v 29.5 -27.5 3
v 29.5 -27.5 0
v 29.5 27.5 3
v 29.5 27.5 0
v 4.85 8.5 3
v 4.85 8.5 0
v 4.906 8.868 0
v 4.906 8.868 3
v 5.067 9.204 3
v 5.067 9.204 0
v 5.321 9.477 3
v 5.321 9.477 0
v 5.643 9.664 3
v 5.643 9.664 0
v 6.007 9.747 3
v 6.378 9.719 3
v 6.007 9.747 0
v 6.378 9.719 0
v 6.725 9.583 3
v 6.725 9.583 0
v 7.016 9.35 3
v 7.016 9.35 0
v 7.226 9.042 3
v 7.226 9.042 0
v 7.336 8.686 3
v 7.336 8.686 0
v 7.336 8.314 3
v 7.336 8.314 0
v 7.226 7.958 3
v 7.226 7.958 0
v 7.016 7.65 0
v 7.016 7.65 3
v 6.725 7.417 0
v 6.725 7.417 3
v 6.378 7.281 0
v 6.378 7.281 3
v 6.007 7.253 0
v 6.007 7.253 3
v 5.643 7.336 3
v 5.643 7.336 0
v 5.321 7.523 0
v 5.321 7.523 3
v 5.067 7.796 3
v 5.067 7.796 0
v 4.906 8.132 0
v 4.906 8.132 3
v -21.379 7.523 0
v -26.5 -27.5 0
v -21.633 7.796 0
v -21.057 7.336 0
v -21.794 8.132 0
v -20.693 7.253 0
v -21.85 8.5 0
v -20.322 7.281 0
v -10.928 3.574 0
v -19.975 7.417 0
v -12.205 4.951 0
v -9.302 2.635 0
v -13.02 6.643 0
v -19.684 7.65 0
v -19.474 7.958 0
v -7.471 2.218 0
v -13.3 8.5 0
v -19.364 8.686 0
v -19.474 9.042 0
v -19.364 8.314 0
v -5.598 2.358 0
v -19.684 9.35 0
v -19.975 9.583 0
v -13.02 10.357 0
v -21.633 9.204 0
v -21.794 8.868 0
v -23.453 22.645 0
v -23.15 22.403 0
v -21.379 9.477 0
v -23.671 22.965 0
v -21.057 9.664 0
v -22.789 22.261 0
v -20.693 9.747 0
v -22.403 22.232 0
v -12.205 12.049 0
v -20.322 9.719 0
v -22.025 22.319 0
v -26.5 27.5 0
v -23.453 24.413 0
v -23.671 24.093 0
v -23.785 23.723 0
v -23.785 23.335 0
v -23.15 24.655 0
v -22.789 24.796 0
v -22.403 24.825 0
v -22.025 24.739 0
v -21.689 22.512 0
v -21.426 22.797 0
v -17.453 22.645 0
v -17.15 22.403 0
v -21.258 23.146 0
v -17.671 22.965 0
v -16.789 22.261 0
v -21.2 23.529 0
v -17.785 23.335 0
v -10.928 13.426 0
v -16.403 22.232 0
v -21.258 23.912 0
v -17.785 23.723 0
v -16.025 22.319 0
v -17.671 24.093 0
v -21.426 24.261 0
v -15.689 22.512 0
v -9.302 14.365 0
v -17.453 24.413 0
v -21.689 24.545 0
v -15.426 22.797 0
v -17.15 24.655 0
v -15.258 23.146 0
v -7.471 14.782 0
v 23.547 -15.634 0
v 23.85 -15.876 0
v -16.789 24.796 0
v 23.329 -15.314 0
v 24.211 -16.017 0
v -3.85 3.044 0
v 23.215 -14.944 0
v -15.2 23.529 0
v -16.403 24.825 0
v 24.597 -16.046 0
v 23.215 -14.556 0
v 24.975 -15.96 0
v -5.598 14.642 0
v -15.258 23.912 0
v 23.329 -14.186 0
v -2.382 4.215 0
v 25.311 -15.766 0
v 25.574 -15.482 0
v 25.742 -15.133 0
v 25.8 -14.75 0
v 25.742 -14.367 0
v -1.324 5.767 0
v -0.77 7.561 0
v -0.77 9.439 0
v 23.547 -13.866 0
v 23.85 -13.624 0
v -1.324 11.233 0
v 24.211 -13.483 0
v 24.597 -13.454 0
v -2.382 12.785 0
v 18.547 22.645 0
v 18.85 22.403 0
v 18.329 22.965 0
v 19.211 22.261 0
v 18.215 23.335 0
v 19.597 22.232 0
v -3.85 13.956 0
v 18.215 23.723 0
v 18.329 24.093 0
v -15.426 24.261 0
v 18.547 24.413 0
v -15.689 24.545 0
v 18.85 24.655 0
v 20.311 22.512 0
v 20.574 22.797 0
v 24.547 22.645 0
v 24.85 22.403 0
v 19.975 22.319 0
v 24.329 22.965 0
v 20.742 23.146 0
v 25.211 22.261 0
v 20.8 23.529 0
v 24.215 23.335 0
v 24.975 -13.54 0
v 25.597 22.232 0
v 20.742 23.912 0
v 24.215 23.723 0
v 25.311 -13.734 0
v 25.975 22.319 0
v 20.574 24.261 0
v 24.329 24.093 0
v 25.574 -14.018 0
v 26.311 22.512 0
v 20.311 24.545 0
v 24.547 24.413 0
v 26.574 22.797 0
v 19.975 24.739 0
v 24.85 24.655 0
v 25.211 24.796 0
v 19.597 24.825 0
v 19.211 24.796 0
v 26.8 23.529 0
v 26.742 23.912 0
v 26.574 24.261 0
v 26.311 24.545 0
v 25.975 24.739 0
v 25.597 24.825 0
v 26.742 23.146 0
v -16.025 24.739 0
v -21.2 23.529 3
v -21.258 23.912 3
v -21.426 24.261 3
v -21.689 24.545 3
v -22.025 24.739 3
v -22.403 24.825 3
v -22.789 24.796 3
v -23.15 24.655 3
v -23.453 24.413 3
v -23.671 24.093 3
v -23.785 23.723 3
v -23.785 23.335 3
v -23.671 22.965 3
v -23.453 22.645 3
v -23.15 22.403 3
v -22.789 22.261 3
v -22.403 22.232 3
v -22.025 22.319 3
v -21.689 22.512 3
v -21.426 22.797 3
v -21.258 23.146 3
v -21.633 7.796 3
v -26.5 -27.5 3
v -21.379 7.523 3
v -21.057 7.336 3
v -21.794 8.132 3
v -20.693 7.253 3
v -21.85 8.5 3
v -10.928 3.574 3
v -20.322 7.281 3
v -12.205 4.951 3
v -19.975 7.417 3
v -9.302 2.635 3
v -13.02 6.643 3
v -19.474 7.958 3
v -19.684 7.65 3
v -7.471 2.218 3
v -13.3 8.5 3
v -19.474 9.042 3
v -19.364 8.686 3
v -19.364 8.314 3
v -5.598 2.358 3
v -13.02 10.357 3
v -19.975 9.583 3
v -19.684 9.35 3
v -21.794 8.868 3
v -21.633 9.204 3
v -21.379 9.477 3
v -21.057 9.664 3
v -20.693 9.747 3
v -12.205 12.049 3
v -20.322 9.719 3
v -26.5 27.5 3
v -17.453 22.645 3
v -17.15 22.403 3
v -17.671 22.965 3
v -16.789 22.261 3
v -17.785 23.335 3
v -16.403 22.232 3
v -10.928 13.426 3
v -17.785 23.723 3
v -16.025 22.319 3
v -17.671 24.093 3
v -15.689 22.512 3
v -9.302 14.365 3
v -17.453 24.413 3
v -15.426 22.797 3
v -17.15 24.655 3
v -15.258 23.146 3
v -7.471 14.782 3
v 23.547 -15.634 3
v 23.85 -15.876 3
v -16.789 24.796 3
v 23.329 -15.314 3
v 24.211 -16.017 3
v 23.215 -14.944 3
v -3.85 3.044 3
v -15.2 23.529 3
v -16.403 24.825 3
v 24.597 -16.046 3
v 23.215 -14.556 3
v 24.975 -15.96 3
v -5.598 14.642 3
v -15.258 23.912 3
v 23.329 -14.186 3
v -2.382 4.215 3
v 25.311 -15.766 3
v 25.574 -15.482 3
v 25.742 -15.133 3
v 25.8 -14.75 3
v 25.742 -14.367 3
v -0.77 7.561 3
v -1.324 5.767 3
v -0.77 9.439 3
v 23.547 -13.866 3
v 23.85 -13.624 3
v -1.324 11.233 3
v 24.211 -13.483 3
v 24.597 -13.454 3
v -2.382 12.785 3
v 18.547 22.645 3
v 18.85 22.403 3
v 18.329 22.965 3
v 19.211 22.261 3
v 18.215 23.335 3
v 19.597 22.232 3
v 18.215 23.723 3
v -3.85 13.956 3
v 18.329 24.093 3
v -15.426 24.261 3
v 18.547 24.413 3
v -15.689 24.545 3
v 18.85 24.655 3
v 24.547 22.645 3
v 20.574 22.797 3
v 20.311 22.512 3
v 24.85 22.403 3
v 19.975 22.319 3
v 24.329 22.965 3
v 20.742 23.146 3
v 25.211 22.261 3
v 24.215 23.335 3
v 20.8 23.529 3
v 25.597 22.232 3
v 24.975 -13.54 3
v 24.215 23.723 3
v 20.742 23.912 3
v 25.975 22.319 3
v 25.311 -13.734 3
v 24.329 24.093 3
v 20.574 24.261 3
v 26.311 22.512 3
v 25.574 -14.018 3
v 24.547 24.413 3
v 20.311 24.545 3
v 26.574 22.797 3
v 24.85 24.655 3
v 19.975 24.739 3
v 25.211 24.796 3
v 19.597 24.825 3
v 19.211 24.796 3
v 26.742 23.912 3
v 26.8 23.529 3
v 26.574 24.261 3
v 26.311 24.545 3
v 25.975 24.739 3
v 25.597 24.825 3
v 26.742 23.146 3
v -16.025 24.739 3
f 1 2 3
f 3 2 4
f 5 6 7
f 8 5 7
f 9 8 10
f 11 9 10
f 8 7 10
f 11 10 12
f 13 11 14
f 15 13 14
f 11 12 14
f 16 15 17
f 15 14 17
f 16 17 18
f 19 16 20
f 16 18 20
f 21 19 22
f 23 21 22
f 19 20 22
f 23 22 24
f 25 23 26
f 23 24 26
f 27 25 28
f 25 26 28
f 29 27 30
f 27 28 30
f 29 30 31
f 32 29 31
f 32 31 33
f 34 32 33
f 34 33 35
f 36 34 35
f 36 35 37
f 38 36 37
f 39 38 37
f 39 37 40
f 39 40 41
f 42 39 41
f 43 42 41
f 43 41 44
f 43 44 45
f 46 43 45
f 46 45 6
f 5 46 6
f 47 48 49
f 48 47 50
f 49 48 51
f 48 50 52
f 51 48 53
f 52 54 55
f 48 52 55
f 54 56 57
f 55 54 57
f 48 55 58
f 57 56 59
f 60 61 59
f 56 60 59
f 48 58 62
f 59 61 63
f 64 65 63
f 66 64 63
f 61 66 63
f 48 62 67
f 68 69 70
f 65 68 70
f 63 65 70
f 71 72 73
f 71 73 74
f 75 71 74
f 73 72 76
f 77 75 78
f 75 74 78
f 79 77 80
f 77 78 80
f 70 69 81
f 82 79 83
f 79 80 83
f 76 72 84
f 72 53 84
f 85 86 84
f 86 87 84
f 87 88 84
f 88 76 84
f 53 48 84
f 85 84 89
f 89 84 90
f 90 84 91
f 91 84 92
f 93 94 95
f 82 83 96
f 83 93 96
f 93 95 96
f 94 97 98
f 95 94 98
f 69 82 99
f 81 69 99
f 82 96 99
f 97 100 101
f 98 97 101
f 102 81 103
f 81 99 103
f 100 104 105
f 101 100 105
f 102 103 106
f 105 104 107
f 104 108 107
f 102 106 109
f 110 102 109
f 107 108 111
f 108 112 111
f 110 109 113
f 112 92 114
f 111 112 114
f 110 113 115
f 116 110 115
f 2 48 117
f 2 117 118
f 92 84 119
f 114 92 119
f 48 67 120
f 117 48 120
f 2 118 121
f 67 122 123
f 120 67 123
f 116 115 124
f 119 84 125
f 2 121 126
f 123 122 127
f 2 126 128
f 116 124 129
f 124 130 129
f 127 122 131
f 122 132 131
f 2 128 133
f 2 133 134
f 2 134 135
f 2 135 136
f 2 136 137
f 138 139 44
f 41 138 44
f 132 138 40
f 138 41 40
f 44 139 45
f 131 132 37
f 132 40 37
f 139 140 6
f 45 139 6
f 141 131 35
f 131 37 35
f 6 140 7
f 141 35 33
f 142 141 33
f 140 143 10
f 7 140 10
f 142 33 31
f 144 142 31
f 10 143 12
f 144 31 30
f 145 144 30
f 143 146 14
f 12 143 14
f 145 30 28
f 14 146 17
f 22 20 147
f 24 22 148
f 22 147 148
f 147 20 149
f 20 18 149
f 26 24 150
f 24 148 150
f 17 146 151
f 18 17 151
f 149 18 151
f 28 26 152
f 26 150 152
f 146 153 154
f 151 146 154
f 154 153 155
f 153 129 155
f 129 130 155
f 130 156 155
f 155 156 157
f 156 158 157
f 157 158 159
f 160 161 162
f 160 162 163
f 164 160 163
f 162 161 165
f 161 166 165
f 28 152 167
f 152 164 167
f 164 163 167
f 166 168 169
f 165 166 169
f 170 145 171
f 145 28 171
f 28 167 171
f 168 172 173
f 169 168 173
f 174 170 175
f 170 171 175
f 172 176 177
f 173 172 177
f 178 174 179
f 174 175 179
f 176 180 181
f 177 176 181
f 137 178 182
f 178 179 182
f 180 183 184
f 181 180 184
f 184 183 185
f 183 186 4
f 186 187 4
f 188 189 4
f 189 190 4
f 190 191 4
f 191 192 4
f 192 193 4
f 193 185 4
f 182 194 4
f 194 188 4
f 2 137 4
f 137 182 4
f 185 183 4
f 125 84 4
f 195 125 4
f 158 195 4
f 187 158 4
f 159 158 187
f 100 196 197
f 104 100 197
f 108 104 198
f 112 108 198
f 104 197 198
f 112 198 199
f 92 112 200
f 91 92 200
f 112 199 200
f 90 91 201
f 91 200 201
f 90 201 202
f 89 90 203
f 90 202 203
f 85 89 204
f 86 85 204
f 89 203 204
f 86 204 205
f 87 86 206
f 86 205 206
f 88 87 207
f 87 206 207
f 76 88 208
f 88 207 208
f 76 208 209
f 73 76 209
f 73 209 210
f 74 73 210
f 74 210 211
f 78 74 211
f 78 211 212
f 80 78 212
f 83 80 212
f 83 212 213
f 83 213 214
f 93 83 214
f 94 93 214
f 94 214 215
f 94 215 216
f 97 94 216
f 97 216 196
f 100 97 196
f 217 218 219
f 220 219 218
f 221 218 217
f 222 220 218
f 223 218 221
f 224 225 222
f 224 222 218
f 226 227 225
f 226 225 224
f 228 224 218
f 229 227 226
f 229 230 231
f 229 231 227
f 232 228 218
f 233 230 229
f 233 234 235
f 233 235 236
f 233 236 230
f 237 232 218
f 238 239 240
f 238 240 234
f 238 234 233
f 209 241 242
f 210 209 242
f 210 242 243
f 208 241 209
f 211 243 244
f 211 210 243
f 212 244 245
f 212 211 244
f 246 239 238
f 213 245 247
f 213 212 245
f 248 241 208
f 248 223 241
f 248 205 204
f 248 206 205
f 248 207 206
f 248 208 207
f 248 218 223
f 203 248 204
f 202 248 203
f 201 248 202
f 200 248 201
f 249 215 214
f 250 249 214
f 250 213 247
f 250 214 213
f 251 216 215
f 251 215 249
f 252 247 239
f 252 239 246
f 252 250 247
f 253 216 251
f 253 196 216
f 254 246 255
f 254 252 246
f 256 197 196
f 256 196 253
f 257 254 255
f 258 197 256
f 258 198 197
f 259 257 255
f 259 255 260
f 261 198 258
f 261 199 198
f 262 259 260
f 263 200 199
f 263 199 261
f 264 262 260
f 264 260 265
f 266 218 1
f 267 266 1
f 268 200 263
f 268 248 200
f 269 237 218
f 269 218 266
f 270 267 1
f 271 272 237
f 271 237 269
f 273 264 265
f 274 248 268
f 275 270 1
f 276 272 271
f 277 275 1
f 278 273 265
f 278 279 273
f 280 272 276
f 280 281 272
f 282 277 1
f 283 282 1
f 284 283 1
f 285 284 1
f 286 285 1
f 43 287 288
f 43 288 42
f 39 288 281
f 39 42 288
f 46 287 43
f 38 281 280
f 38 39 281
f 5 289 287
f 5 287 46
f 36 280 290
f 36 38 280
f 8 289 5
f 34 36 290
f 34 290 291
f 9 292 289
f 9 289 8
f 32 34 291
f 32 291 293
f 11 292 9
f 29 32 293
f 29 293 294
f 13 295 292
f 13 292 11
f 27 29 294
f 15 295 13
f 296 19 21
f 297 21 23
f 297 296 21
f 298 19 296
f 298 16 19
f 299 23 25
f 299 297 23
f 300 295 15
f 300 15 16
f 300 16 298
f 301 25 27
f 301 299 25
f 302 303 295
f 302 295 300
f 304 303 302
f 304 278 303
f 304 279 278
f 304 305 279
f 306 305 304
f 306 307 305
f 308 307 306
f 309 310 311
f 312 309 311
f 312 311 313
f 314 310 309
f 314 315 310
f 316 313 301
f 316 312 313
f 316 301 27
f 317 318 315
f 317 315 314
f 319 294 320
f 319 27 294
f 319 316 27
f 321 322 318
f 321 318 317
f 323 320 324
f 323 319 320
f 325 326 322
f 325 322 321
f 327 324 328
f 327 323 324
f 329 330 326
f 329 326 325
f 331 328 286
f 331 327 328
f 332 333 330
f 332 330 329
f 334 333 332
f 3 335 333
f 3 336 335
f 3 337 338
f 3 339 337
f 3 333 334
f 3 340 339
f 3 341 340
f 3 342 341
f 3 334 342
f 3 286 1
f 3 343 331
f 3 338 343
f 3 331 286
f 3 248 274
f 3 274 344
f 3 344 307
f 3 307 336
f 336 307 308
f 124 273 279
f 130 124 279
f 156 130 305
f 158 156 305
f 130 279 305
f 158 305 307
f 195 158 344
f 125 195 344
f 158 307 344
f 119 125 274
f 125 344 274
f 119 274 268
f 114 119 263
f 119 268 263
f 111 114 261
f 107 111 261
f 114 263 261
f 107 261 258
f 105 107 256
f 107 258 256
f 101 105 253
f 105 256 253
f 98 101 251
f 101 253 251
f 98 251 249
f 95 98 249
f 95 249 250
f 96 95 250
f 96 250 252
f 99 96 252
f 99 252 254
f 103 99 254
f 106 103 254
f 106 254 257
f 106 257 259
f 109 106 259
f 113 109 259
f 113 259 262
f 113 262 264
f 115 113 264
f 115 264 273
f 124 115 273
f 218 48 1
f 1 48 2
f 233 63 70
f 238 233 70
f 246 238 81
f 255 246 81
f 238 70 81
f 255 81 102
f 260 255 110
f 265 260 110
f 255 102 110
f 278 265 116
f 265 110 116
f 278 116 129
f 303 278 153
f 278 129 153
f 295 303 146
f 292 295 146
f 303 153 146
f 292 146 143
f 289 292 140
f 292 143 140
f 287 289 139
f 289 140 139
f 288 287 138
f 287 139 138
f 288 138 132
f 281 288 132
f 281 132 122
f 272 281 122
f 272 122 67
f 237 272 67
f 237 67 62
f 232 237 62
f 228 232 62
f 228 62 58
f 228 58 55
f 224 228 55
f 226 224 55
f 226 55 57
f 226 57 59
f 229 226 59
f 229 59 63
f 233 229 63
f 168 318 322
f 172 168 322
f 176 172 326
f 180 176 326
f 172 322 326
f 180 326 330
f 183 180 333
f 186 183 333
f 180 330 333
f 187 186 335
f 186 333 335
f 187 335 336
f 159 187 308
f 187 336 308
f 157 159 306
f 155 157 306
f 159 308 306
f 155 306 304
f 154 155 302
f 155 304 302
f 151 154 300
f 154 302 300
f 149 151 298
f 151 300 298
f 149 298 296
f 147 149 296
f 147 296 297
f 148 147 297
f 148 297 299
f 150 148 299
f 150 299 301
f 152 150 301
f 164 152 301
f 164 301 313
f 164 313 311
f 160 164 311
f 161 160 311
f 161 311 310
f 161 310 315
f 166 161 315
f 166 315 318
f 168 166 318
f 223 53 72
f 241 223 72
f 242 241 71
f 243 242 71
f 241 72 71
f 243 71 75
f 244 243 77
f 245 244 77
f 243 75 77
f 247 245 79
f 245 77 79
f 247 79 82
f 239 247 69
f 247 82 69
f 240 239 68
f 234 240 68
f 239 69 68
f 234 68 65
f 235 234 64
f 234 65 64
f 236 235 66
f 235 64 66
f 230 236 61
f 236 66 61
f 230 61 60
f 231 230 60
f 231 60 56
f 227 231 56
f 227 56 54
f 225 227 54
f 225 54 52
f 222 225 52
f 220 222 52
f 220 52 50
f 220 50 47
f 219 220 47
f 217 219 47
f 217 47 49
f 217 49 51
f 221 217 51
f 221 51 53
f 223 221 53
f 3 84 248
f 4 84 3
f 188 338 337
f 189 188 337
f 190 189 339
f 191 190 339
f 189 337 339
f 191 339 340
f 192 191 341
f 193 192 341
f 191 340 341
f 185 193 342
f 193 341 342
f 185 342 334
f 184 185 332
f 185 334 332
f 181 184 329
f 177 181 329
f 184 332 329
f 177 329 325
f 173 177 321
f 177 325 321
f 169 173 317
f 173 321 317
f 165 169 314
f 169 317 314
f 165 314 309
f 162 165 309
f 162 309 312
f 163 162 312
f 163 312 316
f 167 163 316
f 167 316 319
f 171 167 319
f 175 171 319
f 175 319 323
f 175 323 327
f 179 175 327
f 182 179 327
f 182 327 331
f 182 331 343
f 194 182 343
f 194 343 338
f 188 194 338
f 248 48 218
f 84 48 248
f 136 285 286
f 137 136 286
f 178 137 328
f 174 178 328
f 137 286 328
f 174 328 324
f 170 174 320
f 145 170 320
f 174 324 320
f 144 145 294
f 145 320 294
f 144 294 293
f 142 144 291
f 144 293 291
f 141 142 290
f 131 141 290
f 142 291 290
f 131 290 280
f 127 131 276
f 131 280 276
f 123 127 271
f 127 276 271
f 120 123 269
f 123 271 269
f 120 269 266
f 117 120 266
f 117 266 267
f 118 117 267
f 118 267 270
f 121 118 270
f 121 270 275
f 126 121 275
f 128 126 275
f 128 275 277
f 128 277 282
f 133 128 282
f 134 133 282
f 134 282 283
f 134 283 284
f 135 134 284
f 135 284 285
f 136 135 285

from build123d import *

# Parameters (mm, degrees)
CROQUIS1_W              = 56
CROQUIS1_H              = 55
SALIENTE_EXTRUIR1_DEPTH = 3
CROQUIS2_R              = 1.3
CORTAR_EXTRUIR1_DEPTH   = 4
CROQUIS3_R              = 6.3
CROQUIS3_R_2            = 1.25
CORTAR_EXTRUIR2_DEPTH   = 4


with BuildPart() as part:
    # Croquis1 → Saliente-Extruir1 (new body)
    with BuildSketch(Plane.XY):
        with Locations((1.5, 0)):
            Rectangle(CROQUIS1_W, CROQUIS1_H)
    extrude(amount=SALIENTE_EXTRUIR1_DEPTH)

    # Croquis2 → Cortar-Extruir1 (cut)
    with BuildSketch(Plane.XY.offset(3)):
        with Locations((25.5, 23.528824725)):
            Circle(CROQUIS2_R)
        with Locations((19.5, 23.528824725)):
            Circle(CROQUIS2_R)
        with Locations((-22.5, 23.528824725)):
            Circle(CROQUIS2_R)
        with Locations((-16.5, 23.528824725)):
            Circle(CROQUIS2_R)
        with Locations((24.5, -14.75)):
            Circle(CROQUIS2_R)
    extrude(amount=-CORTAR_EXTRUIR1_DEPTH, mode=Mode.SUBTRACT)

    # Croquis3 → Cortar-Extruir2 (cut)
    with BuildSketch(Plane(origin=(0, 0, 0), x_dir=(-1, 0, 0), z_dir=(0, 0, -1))):
        with Locations((7, 8.5)):
            Circle(CROQUIS3_R)
        with Locations((20.6, 8.5)):
            Circle(CROQUIS3_R_2)
        with Locations((-6.1, 8.5)):
            Circle(CROQUIS3_R_2)
    extrude(amount=-CORTAR_EXTRUIR2_DEPTH, mode=Mode.SUBTRACT)


solid = part.part
